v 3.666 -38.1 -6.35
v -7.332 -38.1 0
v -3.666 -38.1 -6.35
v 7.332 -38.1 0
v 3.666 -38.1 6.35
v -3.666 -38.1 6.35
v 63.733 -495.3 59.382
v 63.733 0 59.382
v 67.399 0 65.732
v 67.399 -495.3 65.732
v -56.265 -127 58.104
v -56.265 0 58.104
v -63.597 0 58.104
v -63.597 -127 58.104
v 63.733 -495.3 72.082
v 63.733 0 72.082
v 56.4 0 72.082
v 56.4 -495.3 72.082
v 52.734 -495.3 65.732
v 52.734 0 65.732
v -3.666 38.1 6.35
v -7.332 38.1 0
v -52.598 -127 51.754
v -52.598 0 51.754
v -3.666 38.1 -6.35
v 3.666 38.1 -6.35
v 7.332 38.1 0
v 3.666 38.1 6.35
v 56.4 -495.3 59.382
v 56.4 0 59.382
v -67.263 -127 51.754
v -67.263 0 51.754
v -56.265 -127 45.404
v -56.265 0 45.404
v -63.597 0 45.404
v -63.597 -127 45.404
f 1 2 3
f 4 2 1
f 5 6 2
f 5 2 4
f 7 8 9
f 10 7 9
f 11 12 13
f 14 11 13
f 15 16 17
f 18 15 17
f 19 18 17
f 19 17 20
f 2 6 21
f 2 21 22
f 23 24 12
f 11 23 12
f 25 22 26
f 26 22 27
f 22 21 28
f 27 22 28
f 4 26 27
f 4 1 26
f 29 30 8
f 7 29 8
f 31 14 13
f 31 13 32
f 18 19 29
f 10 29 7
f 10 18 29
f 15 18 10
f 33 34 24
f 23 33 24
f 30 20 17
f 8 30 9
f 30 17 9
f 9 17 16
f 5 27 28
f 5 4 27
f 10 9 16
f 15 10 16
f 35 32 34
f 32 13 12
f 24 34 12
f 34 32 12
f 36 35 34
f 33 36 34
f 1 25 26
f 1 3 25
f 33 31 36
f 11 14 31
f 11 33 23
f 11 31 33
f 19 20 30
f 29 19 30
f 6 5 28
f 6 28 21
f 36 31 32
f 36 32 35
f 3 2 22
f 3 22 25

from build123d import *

# Parameters (mm, degrees)
F1_DEPTH = 38.1
F3_DEPTH = 127
F5_DEPTH = 495.3


with BuildPart() as f1:
    # F0 (on Front) → F1 (new body, symmetric)
    with BuildSketch(Plane.XZ):
        Polygon((7.3323484187, 0), (3.6661742094, 6.35), (-3.6661742094, 6.35), (-7.3323484187, 0), (-3.6661742094, -6.35), (3.6661742094, -6.35), align=None)
    extrude(amount=F1_DEPTH, both=True)


with BuildPart() as f3:
    # F2 (on Front) → F3 (new body)
    with BuildSketch(Plane.XZ):
        Polygon((-52.598492423, 51.7540338576), (-56.2646666324, 58.1040338576), (-63.5970150511, 58.1040338576), (-67.2631892604, 51.7540338576), (-63.5970150511, 45.4040338576), (-56.2646666324, 45.4040338576), align=None)
    extrude(amount=F3_DEPTH)


with BuildPart() as f5:
    # F4 (on Front) → F5 (new body)
    with BuildSketch(Plane.XZ):
        Polygon((67.3988673892, 65.7318855762), (63.7326931799, 72.0818855762), (56.4003447612, 72.0818855762), (52.7341705518, 65.7318855762), (56.4003447612, 59.3818855762), (63.7326931799, 59.3818855762), align=None)
    extrude(amount=F5_DEPTH)


solid = Compound([f1.part, f3.part, f5.part])
